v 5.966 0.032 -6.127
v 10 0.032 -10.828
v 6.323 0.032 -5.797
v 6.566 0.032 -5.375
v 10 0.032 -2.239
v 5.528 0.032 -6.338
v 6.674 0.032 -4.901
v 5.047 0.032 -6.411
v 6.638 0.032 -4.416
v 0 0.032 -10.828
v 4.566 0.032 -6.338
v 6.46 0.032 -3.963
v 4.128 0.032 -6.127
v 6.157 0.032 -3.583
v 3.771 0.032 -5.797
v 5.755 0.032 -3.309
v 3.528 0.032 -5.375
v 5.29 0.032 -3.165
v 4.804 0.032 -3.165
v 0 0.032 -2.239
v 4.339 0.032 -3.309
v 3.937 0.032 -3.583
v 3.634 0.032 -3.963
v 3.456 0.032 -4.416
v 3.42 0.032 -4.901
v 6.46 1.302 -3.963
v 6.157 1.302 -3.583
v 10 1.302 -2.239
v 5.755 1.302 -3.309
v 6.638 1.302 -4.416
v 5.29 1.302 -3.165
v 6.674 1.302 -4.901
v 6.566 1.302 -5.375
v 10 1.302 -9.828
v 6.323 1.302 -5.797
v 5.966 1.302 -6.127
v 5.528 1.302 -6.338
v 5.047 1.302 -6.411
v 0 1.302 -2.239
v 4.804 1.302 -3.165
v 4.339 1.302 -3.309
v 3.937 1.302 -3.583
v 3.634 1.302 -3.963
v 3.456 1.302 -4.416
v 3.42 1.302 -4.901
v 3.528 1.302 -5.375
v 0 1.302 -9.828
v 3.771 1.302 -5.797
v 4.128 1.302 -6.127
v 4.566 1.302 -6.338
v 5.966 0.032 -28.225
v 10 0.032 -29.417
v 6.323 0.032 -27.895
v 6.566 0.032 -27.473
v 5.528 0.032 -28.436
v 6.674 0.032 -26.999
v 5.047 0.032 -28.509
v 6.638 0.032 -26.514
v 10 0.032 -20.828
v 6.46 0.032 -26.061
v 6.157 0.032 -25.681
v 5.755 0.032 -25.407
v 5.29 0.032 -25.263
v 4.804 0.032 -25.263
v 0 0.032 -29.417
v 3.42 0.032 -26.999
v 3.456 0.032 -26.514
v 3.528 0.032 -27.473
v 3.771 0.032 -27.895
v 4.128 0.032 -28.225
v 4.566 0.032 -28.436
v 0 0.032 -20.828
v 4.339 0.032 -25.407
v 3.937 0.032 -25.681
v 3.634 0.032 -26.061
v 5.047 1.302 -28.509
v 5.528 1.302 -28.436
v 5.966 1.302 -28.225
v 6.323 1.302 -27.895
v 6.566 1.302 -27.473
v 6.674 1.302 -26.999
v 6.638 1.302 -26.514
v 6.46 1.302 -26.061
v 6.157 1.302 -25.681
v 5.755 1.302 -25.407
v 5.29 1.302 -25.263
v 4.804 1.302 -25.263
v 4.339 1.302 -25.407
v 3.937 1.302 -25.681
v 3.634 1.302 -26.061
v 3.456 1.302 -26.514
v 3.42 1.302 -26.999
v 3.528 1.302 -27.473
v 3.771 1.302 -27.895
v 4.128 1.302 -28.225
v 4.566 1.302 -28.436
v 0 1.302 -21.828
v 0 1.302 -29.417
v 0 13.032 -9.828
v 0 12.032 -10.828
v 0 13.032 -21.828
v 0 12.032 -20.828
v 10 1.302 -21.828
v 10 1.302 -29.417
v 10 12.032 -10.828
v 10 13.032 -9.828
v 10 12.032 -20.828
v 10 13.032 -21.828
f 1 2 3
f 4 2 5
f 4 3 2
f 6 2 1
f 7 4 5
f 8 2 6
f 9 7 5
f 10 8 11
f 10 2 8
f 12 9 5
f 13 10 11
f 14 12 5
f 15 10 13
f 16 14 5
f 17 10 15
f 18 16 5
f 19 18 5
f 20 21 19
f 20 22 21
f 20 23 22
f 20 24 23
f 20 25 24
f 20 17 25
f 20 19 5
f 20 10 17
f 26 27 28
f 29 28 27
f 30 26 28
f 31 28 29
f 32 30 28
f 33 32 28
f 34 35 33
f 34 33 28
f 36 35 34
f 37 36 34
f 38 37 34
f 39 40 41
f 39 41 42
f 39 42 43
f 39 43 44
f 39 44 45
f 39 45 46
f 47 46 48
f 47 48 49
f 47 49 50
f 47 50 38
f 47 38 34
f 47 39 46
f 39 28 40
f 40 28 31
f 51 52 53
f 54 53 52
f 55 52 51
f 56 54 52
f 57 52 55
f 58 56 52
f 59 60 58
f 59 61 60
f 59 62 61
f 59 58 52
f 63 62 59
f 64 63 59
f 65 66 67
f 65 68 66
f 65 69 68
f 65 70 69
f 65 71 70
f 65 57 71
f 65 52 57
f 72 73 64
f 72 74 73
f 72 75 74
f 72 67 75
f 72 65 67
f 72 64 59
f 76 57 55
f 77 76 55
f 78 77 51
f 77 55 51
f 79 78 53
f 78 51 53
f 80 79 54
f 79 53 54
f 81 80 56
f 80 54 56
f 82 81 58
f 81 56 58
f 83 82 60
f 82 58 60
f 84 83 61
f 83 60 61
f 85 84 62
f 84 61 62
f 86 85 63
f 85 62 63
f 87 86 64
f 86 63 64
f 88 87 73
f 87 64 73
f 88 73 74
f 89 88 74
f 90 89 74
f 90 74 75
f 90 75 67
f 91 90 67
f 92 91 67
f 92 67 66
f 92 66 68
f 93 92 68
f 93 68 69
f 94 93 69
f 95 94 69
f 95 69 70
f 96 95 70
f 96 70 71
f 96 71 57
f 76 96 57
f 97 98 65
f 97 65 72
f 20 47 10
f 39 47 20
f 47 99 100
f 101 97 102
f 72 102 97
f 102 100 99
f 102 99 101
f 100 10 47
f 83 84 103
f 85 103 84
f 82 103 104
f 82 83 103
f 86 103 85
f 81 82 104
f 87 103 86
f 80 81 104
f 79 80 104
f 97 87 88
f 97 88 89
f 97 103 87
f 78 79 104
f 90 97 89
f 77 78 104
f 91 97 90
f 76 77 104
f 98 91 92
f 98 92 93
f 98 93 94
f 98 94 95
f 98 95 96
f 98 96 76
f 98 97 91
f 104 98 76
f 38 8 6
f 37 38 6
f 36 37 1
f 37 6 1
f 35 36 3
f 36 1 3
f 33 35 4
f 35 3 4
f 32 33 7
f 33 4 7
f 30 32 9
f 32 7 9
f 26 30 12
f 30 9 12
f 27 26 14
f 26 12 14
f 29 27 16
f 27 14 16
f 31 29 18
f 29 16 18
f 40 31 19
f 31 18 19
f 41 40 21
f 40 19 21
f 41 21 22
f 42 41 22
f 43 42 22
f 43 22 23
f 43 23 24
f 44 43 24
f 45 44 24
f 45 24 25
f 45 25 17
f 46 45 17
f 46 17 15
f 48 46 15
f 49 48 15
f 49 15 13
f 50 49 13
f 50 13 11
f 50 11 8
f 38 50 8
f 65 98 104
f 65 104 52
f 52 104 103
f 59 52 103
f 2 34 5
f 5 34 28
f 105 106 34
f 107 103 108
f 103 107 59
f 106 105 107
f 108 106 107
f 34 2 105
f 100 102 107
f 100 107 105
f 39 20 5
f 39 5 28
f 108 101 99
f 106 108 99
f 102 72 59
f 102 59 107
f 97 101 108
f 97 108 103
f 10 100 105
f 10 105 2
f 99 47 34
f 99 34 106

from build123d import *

# Parameters (mm, degrees)
BOSS_EXTRUDE1_DEPTH          = 10
F_30_0_1285_DIAMETER_HOLE1_D = 3.2639


with BuildPart() as part:
    # Sketch1 → Boss-Extrude1 (new body)
    with BuildSketch(Plane(origin=(0, 0, 0), x_dir=(0, 0, -1), z_dir=(1, 0, 0))):
        Polygon((10.828, 0.032), (2.239, 0.032), (2.239, 1.302), (9.828, 1.302), (9.828, 13.032), (14.543, 13.032), (21.828, 13.032), (21.828, 1.302), (29.417, 1.302), (29.417, 0.032), (20.828, 0.032), (20.828, 12.032), (10.828, 12.032), align=None)
    extrude(amount=BOSS_EXTRUDE1_DEPTH)

    # #30 (0.1285) Diameter Hole1 (through all)
    with Locations(Plane(origin=(5.047, 1.302, -26.877), x_dir=(0, 0, 1), z_dir=(0, 1, 0))):
        with Locations((0, 0), (22.098, 0)):
            Hole(F_30_0_1285_DIAMETER_HOLE1_D / 2)


solid = part.part
